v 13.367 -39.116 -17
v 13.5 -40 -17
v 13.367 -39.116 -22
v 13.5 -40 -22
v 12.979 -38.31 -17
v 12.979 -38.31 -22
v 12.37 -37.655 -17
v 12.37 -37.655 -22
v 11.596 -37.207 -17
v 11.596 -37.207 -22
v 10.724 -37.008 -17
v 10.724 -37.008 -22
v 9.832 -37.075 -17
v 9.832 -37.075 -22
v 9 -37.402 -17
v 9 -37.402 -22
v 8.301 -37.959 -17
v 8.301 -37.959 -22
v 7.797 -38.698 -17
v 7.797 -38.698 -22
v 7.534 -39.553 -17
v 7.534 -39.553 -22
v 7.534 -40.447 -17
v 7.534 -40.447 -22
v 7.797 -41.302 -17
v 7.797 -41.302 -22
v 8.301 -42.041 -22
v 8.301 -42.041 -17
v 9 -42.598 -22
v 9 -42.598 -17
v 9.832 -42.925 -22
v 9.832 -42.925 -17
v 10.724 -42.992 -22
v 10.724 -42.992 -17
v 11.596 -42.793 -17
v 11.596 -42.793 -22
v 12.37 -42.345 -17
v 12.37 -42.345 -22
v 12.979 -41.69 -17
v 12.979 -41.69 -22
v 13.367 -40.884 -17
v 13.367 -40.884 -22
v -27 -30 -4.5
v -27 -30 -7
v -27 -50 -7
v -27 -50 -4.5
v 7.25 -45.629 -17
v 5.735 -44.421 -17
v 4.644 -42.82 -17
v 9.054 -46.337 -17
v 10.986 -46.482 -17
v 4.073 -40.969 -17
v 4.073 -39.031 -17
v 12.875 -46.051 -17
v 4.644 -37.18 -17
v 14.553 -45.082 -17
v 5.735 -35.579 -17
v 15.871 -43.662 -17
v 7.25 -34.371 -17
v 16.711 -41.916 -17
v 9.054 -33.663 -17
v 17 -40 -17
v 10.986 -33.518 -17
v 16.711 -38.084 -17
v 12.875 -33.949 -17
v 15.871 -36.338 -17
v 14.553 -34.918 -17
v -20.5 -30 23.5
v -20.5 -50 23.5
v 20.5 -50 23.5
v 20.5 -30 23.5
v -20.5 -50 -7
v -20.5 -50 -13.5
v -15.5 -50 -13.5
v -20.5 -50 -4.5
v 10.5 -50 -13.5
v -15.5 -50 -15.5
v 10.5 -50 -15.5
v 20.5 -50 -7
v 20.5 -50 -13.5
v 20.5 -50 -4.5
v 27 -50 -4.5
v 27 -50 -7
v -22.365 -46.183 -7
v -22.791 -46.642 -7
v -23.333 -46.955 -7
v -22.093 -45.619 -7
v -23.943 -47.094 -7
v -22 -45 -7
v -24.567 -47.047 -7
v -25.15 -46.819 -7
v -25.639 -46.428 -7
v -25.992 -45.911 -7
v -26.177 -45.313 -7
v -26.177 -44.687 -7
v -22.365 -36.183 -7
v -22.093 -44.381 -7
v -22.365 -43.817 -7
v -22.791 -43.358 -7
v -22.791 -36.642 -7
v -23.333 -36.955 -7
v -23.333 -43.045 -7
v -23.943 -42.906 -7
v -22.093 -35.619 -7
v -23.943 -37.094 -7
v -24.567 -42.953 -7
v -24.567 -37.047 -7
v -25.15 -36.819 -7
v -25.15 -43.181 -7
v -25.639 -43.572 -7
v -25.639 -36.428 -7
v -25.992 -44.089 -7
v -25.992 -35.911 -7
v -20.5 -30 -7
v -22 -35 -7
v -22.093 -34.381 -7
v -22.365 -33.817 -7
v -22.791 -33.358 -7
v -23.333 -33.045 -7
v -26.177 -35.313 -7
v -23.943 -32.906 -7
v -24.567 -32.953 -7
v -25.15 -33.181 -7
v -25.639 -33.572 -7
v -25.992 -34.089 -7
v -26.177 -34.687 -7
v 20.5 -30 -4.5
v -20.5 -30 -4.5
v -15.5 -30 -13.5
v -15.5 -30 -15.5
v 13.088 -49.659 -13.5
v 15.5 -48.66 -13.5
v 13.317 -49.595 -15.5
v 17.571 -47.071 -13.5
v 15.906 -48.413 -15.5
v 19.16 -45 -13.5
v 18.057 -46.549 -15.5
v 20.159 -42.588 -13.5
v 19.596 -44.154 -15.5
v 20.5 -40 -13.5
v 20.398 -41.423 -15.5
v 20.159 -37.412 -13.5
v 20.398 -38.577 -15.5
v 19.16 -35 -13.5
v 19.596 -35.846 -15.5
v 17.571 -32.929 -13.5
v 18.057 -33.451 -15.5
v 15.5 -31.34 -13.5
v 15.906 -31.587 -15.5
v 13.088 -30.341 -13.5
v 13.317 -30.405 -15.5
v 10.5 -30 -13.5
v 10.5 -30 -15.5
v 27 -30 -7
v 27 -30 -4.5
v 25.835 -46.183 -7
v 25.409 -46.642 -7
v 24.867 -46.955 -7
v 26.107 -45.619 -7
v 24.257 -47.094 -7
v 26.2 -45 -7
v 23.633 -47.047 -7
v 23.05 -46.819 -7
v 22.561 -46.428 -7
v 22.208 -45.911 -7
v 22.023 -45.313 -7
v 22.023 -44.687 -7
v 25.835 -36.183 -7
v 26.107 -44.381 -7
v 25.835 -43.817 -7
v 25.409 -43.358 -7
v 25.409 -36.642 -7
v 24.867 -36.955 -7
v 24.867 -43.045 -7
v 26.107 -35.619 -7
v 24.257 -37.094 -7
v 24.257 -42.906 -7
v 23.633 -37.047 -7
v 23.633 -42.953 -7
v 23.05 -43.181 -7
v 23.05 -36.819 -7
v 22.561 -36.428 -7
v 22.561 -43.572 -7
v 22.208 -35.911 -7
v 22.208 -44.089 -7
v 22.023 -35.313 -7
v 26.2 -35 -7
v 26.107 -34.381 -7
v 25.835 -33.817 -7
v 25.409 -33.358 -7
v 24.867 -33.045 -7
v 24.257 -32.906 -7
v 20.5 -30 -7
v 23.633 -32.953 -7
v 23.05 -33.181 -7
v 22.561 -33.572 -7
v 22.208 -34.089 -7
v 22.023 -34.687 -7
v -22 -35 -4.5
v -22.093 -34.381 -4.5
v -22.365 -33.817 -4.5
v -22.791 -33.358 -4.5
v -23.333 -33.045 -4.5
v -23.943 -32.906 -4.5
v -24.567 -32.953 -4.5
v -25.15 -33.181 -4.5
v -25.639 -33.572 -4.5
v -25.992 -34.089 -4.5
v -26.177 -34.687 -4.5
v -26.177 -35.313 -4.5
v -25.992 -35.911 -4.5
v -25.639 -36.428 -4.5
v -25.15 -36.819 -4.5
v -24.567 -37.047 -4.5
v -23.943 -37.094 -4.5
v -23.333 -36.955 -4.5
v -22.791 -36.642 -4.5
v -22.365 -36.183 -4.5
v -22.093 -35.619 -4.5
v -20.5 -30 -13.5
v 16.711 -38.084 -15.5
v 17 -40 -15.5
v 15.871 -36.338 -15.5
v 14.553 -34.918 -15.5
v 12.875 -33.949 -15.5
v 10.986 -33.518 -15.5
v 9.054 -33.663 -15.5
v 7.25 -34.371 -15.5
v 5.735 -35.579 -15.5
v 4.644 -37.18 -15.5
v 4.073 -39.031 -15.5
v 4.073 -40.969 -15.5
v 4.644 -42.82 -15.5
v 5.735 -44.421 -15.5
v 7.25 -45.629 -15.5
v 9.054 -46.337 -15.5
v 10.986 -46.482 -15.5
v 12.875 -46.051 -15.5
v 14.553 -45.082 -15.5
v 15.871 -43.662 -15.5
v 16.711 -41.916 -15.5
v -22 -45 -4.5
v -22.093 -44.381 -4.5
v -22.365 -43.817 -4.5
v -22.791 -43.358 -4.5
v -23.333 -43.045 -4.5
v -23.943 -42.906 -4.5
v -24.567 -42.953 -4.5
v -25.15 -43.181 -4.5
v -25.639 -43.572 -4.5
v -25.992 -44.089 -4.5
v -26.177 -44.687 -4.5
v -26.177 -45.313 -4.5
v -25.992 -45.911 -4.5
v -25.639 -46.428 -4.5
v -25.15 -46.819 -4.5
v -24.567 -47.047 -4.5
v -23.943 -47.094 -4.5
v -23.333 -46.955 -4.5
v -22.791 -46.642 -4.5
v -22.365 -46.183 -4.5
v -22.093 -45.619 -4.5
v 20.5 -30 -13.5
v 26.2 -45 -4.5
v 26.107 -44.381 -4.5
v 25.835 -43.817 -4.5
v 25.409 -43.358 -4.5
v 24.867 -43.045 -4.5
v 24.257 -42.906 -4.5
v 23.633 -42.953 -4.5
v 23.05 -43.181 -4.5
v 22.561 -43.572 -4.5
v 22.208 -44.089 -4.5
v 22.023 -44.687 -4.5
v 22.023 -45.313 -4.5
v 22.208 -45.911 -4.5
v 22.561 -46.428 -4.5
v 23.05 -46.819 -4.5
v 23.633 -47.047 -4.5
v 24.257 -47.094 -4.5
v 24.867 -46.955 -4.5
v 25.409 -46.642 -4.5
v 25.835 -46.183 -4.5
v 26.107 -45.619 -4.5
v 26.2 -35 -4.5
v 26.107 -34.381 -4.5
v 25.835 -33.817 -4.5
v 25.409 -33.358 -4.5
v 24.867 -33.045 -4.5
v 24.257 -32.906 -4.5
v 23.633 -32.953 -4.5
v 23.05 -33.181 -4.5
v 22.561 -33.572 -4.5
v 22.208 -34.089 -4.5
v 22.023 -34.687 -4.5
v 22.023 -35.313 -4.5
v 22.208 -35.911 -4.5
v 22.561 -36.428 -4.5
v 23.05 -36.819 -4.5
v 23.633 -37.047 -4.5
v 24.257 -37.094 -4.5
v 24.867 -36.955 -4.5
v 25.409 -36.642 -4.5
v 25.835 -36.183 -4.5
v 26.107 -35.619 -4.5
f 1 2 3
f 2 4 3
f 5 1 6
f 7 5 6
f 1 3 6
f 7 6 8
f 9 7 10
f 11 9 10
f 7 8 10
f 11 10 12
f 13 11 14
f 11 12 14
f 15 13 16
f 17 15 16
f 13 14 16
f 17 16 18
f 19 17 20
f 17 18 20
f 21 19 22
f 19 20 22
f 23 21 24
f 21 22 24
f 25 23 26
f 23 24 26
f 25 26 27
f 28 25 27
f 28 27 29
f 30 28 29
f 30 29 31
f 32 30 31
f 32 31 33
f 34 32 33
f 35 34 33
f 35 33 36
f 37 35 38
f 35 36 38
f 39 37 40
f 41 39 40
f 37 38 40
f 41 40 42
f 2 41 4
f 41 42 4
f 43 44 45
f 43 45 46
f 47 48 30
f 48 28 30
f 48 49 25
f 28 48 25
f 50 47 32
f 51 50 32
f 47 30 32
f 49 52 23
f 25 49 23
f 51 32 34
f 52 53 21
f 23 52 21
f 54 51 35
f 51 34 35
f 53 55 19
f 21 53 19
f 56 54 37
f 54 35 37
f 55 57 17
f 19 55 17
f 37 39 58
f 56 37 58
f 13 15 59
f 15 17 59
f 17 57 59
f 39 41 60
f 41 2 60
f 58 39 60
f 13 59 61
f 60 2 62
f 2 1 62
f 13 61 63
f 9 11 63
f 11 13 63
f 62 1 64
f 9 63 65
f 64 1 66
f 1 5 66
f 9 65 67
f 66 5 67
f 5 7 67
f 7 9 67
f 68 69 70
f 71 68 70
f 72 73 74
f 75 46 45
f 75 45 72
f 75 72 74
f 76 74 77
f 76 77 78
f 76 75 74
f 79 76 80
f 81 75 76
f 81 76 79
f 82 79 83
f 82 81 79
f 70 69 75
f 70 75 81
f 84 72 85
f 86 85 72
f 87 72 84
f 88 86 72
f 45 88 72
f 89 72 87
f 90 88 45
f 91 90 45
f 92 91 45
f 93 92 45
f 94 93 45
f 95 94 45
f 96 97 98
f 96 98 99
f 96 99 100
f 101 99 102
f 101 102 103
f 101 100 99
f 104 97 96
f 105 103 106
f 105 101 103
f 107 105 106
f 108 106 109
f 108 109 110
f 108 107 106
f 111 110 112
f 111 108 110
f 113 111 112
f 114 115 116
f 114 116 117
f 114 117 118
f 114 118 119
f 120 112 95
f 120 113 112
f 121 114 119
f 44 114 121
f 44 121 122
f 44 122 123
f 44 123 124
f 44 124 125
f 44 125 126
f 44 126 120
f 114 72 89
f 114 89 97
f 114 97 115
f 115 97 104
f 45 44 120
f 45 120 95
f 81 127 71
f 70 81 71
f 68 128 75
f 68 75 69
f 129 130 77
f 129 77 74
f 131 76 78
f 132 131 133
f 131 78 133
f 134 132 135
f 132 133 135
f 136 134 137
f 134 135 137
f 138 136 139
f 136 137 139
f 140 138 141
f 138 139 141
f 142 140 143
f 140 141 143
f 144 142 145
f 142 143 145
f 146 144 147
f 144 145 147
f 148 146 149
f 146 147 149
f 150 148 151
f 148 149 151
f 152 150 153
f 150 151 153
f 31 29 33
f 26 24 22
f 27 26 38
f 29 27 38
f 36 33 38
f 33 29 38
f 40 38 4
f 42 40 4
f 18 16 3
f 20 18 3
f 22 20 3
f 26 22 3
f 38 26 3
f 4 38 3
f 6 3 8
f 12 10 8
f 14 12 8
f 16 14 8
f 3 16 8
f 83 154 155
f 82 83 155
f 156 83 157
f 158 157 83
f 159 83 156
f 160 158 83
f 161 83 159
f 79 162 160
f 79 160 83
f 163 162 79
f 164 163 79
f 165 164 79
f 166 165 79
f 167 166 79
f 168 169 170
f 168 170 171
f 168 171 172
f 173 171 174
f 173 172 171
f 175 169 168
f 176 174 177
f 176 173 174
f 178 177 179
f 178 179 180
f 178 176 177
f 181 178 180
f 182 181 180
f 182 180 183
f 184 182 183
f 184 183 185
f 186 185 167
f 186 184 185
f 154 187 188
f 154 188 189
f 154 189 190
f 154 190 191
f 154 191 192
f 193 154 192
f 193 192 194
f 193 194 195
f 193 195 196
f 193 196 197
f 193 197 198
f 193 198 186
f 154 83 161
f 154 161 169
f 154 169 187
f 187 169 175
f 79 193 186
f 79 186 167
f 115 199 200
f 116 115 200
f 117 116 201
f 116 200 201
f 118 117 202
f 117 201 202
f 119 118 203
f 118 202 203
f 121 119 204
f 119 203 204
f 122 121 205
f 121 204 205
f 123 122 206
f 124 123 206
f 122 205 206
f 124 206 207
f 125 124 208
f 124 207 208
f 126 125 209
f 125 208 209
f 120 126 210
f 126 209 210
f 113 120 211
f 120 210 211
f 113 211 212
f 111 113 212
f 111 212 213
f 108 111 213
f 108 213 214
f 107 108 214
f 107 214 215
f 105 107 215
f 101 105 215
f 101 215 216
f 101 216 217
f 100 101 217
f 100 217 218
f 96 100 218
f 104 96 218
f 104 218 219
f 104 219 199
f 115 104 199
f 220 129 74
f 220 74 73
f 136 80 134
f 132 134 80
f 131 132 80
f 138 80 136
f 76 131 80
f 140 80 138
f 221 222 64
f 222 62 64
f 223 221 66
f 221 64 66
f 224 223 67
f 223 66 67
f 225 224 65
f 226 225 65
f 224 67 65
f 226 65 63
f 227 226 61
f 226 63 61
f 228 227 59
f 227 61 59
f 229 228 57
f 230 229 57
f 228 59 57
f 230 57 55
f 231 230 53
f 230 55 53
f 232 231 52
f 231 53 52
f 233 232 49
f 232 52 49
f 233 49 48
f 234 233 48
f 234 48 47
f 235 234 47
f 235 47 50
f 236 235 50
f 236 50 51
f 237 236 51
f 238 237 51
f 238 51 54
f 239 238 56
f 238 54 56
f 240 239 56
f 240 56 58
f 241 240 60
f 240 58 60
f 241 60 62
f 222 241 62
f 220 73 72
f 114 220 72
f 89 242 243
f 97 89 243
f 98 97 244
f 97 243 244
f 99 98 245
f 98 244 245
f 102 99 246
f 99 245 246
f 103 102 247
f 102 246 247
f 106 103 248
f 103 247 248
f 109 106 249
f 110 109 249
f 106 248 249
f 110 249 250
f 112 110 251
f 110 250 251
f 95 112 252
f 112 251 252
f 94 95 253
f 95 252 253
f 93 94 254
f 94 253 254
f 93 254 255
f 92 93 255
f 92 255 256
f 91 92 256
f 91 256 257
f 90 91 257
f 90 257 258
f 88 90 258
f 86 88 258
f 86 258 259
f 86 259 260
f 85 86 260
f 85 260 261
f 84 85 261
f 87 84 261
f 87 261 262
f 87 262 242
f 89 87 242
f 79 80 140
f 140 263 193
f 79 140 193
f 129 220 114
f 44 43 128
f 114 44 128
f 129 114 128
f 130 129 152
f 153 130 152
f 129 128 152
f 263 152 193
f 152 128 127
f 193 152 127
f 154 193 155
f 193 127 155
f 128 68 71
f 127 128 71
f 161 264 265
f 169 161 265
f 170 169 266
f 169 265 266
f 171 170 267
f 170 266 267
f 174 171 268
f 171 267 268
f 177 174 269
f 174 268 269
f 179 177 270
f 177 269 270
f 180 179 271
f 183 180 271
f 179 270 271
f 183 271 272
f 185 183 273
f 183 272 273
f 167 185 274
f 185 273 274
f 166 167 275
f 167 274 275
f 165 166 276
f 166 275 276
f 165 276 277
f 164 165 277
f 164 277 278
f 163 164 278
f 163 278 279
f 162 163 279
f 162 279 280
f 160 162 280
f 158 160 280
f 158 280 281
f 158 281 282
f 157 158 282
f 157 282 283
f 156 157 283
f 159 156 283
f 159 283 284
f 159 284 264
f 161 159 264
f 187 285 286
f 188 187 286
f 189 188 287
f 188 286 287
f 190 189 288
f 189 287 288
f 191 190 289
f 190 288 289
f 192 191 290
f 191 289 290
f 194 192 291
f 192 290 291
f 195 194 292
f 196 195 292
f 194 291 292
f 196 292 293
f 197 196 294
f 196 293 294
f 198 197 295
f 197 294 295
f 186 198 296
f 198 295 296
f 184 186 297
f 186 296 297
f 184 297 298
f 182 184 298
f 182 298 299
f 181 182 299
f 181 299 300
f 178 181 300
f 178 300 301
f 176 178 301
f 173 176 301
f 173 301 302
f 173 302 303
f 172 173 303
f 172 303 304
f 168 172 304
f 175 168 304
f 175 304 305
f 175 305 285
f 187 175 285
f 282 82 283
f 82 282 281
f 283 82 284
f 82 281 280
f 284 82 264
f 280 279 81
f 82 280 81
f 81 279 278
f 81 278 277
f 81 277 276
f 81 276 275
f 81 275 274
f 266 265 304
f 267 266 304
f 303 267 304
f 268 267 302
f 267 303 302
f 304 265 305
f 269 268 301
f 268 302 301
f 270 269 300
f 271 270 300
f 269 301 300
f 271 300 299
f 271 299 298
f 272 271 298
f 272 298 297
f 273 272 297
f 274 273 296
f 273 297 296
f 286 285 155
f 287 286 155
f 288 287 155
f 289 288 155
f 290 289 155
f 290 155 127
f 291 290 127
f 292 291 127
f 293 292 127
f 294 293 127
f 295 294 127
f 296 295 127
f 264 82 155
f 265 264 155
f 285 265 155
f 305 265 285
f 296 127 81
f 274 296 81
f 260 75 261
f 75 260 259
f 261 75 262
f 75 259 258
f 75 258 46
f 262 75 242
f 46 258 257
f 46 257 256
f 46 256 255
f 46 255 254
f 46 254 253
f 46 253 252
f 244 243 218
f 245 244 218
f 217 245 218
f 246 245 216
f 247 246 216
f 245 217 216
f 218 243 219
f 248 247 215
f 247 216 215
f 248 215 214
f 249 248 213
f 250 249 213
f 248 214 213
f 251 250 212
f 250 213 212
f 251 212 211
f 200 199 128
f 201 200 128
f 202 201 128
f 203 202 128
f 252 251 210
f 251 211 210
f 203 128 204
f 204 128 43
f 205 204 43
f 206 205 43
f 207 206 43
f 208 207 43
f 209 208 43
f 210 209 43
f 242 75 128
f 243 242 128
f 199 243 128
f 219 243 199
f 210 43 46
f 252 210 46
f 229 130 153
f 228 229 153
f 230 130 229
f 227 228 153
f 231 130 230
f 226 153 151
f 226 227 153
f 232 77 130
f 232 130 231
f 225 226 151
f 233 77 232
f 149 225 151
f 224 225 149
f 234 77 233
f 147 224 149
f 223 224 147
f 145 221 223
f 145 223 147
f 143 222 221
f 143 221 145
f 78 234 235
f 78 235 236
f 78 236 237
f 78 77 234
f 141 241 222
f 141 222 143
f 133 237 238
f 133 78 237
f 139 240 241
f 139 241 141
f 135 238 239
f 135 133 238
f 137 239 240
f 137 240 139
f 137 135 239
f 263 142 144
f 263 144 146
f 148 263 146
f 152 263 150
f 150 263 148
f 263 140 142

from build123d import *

# Parameters (mm, degrees)
SKETCH_1_W                  = 54
SKETCH_1_H                  = 39
EXTRUDE_1_DEPTH             = 20
SKETCH_2_W                  = 6.5
SKETCH_2_H                  = 28
CUT_EXTRUDE_1_DEPTH         = 42.003048667
SKETCH_3_W                  = 6.5
SKETCH_3_H                  = 28
CUT_EXTRUDE_2_DEPTH         = 42.003048667
SKETCH_4_W                  = 6.5
SKETCH_4_H                  = 8.5
CUT_EXTRUDE_3_DEPTH         = 42.003048667
SKETCH_5_W                  = 5
SKETCH_5_H                  = 2
CUT_EXTRUDE_4_DEPTH         = 42.003048667
CUT_EXTRUDE_5_DEPTH         = 2
SKETCH_7_W                  = 6.5
SKETCH_7_H                  = 6.5
CUT_EXTRUDE_6_DEPTH         = 42.003048667
HOLE_WIZARD_4_2_4_2_1_D     = 4.2
HOLE_WIZARD_4_2_4_2_1_DEPTH = 30.5


with BuildPart() as part:
    # 草图1 → 凸台-拉伸1 (new body)
    with BuildSketch(Plane.XZ.offset(50)):
        with Locations((0, 4)):
            Rectangle(SKETCH_1_W, SKETCH_1_H)
    extrude(amount=-EXTRUDE_1_DEPTH)

    # 草图2 → 切除-拉伸1 (cut, through all)
    with BuildSketch(Plane(origin=(0, -30, 0), x_dir=(-1, 0, 0), z_dir=(0, 1, 0))):
        with Locations((-23.75, 9.5)):
            Rectangle(SKETCH_2_W, SKETCH_2_H)
    extrude(amount=-CUT_EXTRUDE_1_DEPTH, mode=Mode.SUBTRACT)

    # 草图3 → 切除-拉伸2 (cut, through all)
    with BuildSketch(Plane(origin=(0, -30, 0), x_dir=(-1, 0, 0), z_dir=(0, 1, 0))):
        with Locations((23.75, 9.5)):
            Rectangle(SKETCH_3_W, SKETCH_3_H)
    extrude(amount=-CUT_EXTRUDE_2_DEPTH, mode=Mode.SUBTRACT)

    # 草图4 → 切除-拉伸3 (cut, through all)
    with BuildSketch(Plane(origin=(0, -30, 0), x_dir=(-1, 0, 0), z_dir=(0, 1, 0))):
        with Locations((23.75, -11.25)):
            Rectangle(SKETCH_4_W, SKETCH_4_H)
    extrude(amount=-CUT_EXTRUDE_3_DEPTH, mode=Mode.SUBTRACT)

    # 草图5 → 切除-拉伸4 (cut, through all)
    with BuildSketch(Plane(origin=(0, -30, 0), x_dir=(-1, 0, 0), z_dir=(0, 1, 0))):
        with Locations((18, -14.5)):
            Rectangle(SKETCH_5_W, SKETCH_5_H)
    extrude(amount=-CUT_EXTRUDE_4_DEPTH, mode=Mode.SUBTRACT)

    # 草图6 → 切除-拉伸5 (cut)
    with BuildSketch(Plane(origin=(0, 0, -15.5), x_dir=(-1, 0, 0), z_dir=(0, 0, -1))):
        with BuildLine():
            Line((-10.5, -30), (-27, -30))
            Line((-27, -30), (-27, -50))
            Line((-27, -50), (-10.5, -50))
            ThreePointArc((-10.5, -50), (-20.5, -40), (-10.5, -30))
        make_face()
    extrude(amount=-CUT_EXTRUDE_5_DEPTH, mode=Mode.SUBTRACT)

    # 草图7 → 切除-拉伸6 (cut, through all)
    with BuildSketch(Plane(origin=(0, -30, 0), x_dir=(-1, 0, 0), z_dir=(0, 1, 0))):
        with Locations((-23.75, -10.25)):
            Rectangle(SKETCH_7_W, SKETCH_7_H)
    extrude(amount=-CUT_EXTRUDE_6_DEPTH, mode=Mode.SUBTRACT)

    # 草图8 → 旋转1 (revolve)
    with BuildSketch(Plane(origin=(0, -40, 0), x_dir=(1, 0, 0), z_dir=(0, 1, 0))):
        Polygon((13.5, 22), (10.5, 22), (10.5, 15.5), (17, 15.5), (17, 17), (13.5, 17), align=None)
    revolve(axis=Axis((10.5, -40, -22), (0, 0, 1)))

    # Ø4.2 (4.2) 直径孔1
    with Locations(Plane(origin=(0, 0, -7), x_dir=(-1, 0, 0), z_dir=(0, 0, -1))):
        with Locations((24.1, -45), (24.1, -35), (-24.1, -45), (-24.1, -35)):
            Hole(HOLE_WIZARD_4_2_4_2_1_D / 2, depth=HOLE_WIZARD_4_2_4_2_1_DEPTH)


solid = part.part
